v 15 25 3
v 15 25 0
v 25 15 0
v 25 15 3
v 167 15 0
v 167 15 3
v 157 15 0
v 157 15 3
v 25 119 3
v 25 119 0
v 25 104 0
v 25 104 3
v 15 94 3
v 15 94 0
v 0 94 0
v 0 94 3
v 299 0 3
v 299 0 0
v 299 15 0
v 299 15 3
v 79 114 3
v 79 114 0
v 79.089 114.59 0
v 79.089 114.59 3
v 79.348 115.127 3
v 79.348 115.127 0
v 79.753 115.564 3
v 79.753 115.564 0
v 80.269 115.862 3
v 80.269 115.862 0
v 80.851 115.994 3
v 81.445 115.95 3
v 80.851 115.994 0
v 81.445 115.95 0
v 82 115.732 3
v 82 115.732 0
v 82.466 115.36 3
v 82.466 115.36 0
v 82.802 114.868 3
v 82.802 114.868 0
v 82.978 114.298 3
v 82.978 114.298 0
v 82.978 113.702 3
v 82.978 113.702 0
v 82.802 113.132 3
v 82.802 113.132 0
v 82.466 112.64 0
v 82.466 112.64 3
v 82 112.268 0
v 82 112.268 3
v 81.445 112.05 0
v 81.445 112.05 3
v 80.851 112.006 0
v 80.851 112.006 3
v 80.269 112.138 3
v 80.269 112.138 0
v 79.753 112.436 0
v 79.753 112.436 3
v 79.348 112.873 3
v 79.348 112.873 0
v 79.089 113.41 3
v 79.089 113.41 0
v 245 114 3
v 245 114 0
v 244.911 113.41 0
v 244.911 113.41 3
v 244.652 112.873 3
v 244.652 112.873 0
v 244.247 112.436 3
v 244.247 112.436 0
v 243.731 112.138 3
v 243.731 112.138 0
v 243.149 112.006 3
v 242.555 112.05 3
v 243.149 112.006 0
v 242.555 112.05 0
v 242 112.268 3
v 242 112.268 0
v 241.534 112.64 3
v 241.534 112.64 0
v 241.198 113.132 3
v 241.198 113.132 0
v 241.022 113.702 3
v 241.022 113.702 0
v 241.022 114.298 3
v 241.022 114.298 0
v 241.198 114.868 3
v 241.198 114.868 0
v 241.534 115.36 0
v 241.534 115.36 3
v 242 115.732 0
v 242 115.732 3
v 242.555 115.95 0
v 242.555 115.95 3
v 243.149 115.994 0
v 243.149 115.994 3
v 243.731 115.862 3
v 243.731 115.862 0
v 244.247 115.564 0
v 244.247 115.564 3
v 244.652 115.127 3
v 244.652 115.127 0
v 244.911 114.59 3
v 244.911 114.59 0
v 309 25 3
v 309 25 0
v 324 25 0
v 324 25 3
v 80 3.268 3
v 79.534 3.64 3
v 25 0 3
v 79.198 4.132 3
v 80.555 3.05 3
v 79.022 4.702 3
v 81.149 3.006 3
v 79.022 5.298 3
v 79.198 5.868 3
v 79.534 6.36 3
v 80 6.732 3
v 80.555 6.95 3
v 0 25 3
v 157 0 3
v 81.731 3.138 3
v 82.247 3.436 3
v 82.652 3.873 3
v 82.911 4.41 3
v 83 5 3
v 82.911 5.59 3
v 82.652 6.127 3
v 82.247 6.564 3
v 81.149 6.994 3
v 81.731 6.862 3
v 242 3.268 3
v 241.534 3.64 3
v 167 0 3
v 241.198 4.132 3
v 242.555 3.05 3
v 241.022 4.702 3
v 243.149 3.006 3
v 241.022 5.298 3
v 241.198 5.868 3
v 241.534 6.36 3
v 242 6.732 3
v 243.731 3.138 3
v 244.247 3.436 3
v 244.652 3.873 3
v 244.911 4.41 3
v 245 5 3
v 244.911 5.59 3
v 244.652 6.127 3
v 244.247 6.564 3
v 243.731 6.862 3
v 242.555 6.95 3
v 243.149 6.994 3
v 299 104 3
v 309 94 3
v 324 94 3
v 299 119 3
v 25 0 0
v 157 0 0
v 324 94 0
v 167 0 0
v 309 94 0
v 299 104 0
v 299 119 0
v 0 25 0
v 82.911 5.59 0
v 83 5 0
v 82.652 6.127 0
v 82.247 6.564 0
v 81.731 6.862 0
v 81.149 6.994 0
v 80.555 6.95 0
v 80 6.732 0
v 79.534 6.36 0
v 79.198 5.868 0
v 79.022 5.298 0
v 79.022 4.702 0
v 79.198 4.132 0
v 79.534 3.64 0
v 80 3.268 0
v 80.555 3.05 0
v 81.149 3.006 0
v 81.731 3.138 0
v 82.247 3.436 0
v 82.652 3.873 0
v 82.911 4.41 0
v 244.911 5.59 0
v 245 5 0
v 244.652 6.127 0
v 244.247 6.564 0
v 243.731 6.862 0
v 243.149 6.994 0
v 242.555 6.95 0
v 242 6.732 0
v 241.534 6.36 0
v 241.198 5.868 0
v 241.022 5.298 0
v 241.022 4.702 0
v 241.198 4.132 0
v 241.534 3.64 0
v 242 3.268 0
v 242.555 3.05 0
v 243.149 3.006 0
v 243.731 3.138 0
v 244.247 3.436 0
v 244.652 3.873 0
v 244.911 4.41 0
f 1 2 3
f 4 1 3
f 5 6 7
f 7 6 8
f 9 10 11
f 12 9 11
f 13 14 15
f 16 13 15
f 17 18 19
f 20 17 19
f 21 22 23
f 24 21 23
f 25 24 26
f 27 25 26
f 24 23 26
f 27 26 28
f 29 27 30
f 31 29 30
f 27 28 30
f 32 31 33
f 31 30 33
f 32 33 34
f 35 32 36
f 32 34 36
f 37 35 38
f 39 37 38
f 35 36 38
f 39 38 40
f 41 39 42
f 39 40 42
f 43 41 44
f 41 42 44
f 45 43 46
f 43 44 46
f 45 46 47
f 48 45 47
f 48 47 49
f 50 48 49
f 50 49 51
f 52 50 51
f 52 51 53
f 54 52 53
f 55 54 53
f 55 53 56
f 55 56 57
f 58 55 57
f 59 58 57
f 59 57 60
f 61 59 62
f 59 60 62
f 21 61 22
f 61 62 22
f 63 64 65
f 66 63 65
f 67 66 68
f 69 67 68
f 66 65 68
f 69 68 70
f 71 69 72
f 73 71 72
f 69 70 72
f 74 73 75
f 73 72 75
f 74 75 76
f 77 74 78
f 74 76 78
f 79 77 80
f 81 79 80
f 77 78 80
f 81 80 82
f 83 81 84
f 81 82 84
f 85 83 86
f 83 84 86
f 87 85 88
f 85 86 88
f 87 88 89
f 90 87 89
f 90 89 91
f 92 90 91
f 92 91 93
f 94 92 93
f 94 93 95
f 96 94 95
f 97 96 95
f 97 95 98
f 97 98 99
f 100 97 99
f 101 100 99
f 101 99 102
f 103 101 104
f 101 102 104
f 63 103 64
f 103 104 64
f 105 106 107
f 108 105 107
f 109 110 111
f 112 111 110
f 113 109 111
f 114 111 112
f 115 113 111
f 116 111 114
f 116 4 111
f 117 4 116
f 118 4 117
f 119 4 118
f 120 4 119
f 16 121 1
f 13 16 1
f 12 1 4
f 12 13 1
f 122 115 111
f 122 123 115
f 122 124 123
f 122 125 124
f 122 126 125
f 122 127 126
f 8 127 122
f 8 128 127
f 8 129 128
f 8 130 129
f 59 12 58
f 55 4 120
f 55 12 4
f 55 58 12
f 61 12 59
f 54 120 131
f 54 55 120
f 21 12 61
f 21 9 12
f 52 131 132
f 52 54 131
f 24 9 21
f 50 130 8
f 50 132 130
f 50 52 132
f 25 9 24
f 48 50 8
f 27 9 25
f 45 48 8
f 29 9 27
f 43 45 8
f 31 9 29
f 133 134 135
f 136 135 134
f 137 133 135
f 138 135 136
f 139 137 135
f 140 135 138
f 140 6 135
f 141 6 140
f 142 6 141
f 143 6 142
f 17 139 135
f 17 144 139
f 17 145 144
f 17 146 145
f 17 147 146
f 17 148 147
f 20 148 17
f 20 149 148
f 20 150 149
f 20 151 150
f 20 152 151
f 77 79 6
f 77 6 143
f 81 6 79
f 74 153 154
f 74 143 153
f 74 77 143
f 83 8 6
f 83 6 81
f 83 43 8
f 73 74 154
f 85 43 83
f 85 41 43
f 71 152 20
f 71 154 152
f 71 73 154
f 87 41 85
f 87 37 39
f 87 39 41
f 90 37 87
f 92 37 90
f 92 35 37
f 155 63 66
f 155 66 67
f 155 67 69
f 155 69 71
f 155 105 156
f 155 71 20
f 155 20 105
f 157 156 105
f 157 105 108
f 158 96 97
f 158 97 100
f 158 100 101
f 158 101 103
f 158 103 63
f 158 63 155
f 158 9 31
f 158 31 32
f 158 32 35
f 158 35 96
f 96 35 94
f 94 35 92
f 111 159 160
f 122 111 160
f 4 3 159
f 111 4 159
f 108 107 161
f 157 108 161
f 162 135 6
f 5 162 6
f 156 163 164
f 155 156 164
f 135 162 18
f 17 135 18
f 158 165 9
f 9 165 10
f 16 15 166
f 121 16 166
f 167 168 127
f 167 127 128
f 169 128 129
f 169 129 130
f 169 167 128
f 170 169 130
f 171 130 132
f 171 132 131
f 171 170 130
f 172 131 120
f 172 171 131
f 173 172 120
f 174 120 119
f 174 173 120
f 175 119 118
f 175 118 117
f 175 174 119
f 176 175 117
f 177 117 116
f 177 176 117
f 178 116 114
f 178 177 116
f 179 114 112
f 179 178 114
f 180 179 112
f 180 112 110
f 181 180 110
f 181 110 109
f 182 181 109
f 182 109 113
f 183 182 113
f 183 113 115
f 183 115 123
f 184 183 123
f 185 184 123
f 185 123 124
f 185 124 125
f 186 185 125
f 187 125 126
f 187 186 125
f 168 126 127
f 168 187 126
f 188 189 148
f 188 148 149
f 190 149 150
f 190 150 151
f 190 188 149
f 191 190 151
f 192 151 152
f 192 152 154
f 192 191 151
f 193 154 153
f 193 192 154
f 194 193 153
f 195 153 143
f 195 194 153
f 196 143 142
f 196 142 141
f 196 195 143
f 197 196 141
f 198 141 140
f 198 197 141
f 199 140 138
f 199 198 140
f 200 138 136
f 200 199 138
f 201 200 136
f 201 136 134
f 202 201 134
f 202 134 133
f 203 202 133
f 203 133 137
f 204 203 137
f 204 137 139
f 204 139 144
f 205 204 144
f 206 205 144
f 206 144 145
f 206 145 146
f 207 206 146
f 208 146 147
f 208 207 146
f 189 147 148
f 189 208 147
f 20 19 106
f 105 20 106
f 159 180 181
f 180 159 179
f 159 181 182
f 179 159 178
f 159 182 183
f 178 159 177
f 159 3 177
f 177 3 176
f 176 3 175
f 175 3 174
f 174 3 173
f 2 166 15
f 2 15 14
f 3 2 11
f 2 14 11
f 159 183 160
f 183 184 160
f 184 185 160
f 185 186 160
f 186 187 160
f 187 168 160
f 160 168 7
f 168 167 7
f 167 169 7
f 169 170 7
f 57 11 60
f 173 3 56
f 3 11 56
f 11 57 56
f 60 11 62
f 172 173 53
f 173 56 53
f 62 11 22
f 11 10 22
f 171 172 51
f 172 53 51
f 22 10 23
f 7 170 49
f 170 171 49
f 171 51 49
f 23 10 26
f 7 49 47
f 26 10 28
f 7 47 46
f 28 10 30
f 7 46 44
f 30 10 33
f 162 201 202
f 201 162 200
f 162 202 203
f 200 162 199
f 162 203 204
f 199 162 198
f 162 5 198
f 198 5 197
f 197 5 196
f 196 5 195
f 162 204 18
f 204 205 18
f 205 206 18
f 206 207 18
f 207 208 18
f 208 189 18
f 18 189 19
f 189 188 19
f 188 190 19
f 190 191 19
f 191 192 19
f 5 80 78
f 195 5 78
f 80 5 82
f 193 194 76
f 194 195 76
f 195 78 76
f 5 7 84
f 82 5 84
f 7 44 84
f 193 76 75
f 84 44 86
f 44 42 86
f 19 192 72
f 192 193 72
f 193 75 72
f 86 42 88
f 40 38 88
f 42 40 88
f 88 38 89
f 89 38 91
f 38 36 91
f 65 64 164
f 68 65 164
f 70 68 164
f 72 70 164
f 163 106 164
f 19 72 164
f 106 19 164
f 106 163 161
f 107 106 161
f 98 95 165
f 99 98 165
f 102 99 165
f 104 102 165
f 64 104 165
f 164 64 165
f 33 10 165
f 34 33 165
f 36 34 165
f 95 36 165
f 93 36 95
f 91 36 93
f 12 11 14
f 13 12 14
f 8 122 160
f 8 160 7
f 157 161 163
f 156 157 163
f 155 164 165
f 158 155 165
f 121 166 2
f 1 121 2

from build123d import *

# Parameters (mm, degrees)
SKETCH2_R           = 2
BOSS_EXTRUDE1_DEPTH = 3
SKETCH3_W           = 5
SKETCH3_H           = 15
CUT_EXTRUDE1_DEPTH  = 3


with BuildPart() as part:
    # Sketch2 → Boss-Extrude1 (new body)
    with BuildSketch(Plane.XY):
        with BuildLine():
            Line((0, 94), (0, 59.5))
            Line((0, 59.5), (162, 59.5))
            Line((162, 59.5), (162, 114))
            Line((162, 114), (83, 114))
            ThreePointArc((83, 114), (81, 112), (79, 114))
            Line((79, 114), (25, 114))
            Line((25, 114), (25, 104))
            Line((25, 104), (15, 94))
            Line((15, 94), (0, 94))
        make_face()
        with BuildLine():
            Line((83, 114), (162, 114))
            Line((162, 114), (162, 119))
            Line((162, 119), (25, 119))
            Line((25, 119), (25, 114))
            Line((25, 114), (79, 114))
            ThreePointArc((79, 114), (81, 116), (83, 114))
        make_face()
        with BuildLine():
            Line((162, 119), (162, 114))
            Line((162, 114), (241, 114))
            ThreePointArc((241, 114), (243, 116), (245, 114))
            Line((245, 114), (299, 114))
            Line((299, 114), (299, 119))
            Line((299, 119), (162, 119))
        make_face()
        with BuildLine():
            Line((162, 114), (162, 59.5))
            Line((162, 59.5), (324, 59.5))
            Line((324, 59.5), (324, 94))
            Line((324, 94), (309, 94))
            Line((309, 94), (299, 104))
            Line((299, 104), (299, 114))
            Line((299, 114), (245, 114))
            ThreePointArc((245, 114), (243, 112), (241, 114))
            Line((241, 114), (162, 114))
        make_face()
        Polygon((162, 59.5), (162, 0), (299, 0), (299, 15), (309, 25), (324, 25), (324, 59.5), align=None)
        with Locations((243, 5)):
            Circle(SKETCH2_R, mode=Mode.SUBTRACT)
        Polygon((25, 15), (25, 0), (162, 0), (162, 59.5), (0, 59.5), (0, 25), (15, 25), align=None)
        with Locations((81, 5)):
            Circle(SKETCH2_R, mode=Mode.SUBTRACT)
    extrude(amount=BOSS_EXTRUDE1_DEPTH)

    # Sketch3 → Cut-Extrude1 (cut)
    with BuildSketch(Plane.XY.offset(3)):
        with Locations((159.5, 7.5)):
            Rectangle(SKETCH3_W, SKETCH3_H)
        with Locations((164.5, 7.5)):
            Rectangle(SKETCH3_W, SKETCH3_H)
    extrude(amount=-CUT_EXTRUDE1_DEPTH, mode=Mode.SUBTRACT)


solid = part.part
